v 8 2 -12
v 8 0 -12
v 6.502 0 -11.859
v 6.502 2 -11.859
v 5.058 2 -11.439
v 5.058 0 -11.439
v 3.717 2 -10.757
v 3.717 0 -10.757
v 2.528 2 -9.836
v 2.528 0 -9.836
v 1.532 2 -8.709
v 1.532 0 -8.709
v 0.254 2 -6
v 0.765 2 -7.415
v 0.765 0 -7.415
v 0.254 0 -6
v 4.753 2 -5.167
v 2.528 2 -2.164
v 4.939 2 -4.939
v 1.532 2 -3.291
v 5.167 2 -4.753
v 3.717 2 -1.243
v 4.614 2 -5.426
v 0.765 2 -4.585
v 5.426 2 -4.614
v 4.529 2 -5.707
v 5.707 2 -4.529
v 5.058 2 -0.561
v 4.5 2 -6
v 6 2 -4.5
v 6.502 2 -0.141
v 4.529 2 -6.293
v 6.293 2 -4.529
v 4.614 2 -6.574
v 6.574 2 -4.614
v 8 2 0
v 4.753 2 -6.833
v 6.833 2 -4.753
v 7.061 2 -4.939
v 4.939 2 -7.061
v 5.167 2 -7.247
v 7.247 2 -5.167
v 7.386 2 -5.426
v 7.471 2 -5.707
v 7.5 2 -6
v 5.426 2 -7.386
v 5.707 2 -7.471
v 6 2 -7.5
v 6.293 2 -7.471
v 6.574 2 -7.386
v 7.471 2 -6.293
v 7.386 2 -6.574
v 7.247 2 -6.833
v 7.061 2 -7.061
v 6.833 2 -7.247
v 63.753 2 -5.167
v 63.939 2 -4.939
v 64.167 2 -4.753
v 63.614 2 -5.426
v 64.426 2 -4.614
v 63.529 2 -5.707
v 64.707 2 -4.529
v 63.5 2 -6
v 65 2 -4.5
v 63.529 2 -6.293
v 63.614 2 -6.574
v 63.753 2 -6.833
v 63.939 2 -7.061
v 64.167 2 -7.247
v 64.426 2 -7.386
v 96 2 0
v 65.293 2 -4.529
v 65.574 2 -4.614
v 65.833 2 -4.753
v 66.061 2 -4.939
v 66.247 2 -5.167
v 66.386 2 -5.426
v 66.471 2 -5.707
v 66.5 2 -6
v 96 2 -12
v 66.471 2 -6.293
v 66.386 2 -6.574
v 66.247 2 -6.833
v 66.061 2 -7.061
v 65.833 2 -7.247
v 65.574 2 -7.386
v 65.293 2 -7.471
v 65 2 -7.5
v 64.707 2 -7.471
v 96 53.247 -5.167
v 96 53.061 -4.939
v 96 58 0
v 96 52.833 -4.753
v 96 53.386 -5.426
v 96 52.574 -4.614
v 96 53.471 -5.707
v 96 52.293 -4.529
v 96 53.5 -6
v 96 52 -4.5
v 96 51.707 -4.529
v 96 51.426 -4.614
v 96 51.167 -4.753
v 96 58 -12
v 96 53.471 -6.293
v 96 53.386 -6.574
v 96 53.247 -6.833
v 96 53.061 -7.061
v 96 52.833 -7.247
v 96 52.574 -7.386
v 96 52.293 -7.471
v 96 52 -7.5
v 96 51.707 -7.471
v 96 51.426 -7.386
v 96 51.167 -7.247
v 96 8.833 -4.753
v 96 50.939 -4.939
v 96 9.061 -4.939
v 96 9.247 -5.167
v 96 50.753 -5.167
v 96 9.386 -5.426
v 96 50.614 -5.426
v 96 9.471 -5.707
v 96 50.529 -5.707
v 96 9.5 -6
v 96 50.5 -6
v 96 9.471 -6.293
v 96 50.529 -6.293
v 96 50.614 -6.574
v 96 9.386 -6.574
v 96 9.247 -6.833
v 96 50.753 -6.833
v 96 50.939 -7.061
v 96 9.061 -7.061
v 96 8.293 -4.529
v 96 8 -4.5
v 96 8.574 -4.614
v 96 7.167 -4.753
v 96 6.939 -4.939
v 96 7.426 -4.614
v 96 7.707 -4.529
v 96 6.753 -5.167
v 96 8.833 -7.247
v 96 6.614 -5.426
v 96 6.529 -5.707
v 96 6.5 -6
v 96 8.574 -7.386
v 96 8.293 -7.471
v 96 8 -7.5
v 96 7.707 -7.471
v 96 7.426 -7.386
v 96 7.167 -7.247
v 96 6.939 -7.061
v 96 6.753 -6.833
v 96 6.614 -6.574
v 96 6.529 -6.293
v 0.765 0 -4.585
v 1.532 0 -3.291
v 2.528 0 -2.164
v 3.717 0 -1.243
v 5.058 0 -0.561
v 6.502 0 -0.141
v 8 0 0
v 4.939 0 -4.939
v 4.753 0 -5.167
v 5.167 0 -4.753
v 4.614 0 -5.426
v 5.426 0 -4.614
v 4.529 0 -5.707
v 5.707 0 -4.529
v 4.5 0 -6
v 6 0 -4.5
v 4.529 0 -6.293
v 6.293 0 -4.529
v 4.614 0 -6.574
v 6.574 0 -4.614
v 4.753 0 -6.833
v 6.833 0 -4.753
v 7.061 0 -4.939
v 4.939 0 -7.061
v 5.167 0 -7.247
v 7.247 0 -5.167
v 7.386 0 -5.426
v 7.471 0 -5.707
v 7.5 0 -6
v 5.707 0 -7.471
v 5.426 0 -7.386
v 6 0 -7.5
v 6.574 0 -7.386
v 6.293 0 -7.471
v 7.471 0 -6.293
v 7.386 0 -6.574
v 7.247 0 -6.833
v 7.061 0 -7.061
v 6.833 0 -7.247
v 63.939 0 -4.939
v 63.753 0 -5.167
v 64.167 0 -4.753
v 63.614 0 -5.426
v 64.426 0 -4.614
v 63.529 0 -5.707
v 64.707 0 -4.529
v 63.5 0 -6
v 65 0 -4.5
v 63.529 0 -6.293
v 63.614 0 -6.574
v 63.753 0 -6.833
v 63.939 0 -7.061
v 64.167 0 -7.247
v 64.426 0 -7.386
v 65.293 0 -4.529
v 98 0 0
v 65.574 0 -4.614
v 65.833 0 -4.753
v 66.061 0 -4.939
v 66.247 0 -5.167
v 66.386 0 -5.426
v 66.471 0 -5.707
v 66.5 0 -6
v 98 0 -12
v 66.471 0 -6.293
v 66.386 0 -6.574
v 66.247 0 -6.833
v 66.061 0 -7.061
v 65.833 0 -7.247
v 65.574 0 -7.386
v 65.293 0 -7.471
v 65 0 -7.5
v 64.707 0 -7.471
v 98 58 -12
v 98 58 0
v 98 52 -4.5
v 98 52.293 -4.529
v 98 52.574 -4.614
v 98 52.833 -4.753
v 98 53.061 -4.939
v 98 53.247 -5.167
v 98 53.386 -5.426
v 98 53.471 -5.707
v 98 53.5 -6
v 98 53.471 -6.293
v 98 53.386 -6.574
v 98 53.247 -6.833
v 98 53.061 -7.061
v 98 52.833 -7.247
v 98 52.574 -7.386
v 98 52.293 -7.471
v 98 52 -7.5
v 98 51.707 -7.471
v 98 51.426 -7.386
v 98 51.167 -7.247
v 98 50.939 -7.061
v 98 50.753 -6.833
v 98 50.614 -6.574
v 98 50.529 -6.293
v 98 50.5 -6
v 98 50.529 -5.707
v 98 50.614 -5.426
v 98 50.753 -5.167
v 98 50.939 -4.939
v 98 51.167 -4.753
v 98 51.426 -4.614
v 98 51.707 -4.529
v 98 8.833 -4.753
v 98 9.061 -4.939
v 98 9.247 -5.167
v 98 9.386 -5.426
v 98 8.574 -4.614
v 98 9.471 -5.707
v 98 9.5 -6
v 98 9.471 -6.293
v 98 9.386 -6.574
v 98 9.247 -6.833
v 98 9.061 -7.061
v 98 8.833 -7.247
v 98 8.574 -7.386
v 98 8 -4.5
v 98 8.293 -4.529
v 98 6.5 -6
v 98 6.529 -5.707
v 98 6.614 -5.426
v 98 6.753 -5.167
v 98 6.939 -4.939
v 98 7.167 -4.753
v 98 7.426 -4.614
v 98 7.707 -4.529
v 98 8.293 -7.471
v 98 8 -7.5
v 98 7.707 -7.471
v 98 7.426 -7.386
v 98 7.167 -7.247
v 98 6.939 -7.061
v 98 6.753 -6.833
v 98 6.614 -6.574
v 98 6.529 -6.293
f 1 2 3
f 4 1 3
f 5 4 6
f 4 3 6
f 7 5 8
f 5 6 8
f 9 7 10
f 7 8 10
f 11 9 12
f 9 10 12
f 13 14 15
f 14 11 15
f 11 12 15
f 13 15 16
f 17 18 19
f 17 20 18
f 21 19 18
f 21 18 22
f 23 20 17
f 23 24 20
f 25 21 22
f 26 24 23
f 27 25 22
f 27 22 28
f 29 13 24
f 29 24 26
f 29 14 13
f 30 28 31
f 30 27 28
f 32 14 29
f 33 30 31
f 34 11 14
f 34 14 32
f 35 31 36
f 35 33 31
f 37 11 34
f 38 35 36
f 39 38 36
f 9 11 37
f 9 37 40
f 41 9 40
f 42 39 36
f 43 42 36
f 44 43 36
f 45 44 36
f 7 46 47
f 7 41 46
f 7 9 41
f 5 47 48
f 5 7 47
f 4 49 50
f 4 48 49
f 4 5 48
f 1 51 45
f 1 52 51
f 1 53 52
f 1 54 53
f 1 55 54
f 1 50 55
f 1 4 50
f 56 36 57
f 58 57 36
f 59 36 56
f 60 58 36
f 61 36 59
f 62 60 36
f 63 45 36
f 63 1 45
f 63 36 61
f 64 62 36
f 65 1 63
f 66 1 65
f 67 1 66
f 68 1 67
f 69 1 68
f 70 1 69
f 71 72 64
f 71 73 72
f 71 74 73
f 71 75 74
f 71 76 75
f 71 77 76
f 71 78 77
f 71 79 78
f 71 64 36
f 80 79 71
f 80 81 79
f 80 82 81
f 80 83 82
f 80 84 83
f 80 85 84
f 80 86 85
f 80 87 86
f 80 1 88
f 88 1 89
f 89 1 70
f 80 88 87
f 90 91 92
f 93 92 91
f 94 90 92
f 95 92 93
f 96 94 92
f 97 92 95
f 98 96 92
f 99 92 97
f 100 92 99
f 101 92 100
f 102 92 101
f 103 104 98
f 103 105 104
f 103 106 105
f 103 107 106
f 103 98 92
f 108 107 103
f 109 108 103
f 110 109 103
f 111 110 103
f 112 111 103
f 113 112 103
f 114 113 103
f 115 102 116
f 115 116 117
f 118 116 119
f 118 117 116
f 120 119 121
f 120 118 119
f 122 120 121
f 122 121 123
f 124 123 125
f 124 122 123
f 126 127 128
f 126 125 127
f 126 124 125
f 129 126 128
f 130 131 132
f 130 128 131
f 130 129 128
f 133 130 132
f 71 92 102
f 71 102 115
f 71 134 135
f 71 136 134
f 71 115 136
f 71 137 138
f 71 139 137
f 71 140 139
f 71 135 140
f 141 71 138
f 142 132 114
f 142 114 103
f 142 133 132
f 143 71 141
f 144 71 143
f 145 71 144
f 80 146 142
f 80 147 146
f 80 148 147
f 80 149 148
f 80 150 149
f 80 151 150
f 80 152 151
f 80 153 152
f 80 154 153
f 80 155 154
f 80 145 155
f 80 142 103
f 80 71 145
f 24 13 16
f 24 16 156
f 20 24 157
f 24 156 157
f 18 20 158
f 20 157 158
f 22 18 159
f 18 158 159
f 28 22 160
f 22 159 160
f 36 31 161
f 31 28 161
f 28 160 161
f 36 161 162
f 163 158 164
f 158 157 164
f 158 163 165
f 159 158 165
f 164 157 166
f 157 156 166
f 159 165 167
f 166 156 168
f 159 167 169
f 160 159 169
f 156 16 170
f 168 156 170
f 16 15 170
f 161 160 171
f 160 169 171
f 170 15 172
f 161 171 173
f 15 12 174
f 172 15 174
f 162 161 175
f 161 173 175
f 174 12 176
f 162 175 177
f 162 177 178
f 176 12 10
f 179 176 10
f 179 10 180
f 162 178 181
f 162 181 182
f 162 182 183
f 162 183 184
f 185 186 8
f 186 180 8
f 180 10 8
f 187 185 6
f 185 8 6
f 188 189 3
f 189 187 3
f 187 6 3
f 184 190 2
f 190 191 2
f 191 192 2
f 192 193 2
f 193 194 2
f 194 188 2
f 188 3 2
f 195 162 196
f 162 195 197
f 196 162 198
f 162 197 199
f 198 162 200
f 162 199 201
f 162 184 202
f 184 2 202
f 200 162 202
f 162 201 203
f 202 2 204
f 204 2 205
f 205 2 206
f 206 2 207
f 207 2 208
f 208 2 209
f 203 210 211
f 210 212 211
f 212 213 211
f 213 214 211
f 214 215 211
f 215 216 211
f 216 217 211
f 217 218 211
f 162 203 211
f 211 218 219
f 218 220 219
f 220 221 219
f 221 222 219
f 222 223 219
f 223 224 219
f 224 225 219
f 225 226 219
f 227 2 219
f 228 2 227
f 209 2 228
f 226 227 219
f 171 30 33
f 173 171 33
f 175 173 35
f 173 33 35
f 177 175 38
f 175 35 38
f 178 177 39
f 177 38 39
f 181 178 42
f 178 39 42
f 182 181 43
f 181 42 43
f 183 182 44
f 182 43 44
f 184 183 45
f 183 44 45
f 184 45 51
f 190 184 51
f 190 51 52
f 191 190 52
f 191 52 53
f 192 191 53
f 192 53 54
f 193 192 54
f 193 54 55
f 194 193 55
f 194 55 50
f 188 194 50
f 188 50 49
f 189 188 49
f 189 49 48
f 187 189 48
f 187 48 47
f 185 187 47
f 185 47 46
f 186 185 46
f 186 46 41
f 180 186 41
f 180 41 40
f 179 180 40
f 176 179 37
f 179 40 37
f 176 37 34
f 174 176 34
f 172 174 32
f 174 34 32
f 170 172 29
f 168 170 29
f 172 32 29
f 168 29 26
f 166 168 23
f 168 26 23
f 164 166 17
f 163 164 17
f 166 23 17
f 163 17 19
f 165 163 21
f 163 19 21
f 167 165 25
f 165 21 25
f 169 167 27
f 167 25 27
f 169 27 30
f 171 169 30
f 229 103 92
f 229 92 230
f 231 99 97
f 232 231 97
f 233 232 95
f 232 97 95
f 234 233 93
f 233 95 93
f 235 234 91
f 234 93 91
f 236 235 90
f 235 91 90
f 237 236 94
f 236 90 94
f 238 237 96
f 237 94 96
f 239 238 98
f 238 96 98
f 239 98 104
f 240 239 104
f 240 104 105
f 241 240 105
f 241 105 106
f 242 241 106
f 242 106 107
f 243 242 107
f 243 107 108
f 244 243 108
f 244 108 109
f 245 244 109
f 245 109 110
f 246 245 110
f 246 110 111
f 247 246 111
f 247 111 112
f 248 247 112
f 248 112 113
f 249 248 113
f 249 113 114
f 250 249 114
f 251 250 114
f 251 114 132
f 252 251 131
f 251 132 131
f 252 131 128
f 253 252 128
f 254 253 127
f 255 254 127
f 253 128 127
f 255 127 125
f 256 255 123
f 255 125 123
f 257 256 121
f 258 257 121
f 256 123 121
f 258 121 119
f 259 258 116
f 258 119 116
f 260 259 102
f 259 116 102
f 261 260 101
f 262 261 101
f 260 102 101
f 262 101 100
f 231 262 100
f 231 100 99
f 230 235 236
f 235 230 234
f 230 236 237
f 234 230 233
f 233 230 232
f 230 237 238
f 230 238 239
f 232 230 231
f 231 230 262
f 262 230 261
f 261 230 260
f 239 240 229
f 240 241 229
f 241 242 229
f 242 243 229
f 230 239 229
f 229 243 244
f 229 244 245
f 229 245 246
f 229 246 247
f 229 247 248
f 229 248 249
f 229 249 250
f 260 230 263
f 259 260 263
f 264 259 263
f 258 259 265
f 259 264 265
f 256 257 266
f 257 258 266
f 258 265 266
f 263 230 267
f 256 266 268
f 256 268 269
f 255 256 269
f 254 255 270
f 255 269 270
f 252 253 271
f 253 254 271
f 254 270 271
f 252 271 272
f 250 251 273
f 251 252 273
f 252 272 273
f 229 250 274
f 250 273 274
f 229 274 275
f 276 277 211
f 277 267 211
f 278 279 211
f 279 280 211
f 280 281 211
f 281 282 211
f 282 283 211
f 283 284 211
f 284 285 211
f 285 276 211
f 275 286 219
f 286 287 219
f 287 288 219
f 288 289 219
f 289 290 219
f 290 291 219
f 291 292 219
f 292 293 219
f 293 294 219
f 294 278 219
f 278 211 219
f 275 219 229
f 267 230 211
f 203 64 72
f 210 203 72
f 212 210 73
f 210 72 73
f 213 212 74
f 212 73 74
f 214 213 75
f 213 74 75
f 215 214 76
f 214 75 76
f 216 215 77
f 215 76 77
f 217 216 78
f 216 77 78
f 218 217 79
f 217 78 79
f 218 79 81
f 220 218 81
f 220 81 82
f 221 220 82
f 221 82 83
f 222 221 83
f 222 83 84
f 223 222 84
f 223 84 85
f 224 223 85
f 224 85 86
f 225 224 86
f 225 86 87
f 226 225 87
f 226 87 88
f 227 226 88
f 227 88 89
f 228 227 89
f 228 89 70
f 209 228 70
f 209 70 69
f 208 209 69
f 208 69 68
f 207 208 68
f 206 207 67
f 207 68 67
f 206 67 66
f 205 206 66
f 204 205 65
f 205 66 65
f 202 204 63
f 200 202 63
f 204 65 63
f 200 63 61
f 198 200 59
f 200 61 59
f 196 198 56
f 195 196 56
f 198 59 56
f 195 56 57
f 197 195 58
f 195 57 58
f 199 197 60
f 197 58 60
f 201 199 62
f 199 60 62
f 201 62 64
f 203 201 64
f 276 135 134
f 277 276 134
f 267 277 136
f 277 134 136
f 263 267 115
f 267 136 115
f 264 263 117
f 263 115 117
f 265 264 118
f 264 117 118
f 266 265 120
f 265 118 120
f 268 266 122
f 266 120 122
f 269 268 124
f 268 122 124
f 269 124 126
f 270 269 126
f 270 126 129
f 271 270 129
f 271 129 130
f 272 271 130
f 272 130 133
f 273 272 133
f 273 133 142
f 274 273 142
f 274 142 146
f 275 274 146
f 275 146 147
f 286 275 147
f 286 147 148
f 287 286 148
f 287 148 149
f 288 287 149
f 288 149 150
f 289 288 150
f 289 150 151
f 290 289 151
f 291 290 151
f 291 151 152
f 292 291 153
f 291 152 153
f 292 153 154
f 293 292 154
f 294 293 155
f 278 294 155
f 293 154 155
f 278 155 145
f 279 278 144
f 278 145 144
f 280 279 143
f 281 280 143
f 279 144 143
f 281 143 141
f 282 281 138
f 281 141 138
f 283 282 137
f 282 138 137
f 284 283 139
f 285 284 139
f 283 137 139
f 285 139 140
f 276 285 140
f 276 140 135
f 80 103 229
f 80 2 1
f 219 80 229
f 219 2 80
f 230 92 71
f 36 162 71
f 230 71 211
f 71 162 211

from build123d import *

# Parameters (mm, degrees)
SKETCH1_W           = 98
SKETCH1_H           = 12
BOSS_EXTRUDE1_DEPTH = 2
SKETCH2_W           = 2
SKETCH2_H           = 12
BOSS_EXTRUDE2_DEPTH = 56
SKETCH3_R           = 1.5
CUT_EXTRUDE1_DEPTH  = 114.507708989
FILLET1_R           = 8
SKETCH4_R           = 1.5
CUT_EXTRUDE2_DEPTH  = 113.584591032


with BuildPart() as part:
    # Sketch1 → Boss-Extrude1 (new body)
    with BuildSketch(Plane(origin=(0, 0, 0), x_dir=(1, 0, 0), z_dir=(0, 1, 0))):
        with Locations((49, 6)):
            Rectangle(SKETCH1_W, SKETCH1_H)
    extrude(amount=BOSS_EXTRUDE1_DEPTH)

    # Sketch2 → Boss-Extrude2 (add)
    with BuildSketch(Plane(origin=(0, 2, 0), x_dir=(1, 0, 0), z_dir=(0, 1, 0))):
        with Locations((97, 6)):
            Rectangle(SKETCH2_W, SKETCH2_H)
    extrude(amount=BOSS_EXTRUDE2_DEPTH)

    # Sketch3 → Cut-Extrude1 (cut, through all)
    with BuildSketch(Plane(origin=(0, 2, 0), x_dir=(1, 0, 0), z_dir=(0, 1, 0))):
        with Locations(Location((6, 6, 0), (0, 0, 270))):
            Circle(SKETCH3_R)
        with Locations(Location((65, 6, 0), (0, 0, 270))):
            Circle(SKETCH3_R)
    extrude(amount=-CUT_EXTRUDE1_DEPTH, mode=Mode.SUBTRACT)

    # Fillet1
    # the kernel refuses this fillet: 8 mm, written as the material it takes off along each edge
    with BuildSketch(Plane(origin=(0, -20, 0), x_dir=(1, 0, 0), z_dir=(0, 1, 0)), Plane(origin=(0, -20, -12), x_dir=(0, 0, 1), z_dir=(0, 1, 0))) as fillet1_piece_1:
        with BuildLine():
            CenterArc((FILLET1_R, FILLET1_R), FILLET1_R, 180, 90)
            Line((0, FILLET1_R), (0, 0))
            Line((0, 0), (FILLET1_R, 0))
        make_face()
    extrude(amount=42, mode=Mode.SUBTRACT)

    # Sketch4 → Cut-Extrude2 (cut, through all)
    with BuildSketch(Plane.ZY.offset(-96)):
        with Locations((-6, 8)):
            Circle(SKETCH4_R)
        with Locations((-6, 52)):
            Circle(SKETCH4_R)
    extrude(amount=-CUT_EXTRUDE2_DEPTH, mode=Mode.SUBTRACT)


solid = part.part
